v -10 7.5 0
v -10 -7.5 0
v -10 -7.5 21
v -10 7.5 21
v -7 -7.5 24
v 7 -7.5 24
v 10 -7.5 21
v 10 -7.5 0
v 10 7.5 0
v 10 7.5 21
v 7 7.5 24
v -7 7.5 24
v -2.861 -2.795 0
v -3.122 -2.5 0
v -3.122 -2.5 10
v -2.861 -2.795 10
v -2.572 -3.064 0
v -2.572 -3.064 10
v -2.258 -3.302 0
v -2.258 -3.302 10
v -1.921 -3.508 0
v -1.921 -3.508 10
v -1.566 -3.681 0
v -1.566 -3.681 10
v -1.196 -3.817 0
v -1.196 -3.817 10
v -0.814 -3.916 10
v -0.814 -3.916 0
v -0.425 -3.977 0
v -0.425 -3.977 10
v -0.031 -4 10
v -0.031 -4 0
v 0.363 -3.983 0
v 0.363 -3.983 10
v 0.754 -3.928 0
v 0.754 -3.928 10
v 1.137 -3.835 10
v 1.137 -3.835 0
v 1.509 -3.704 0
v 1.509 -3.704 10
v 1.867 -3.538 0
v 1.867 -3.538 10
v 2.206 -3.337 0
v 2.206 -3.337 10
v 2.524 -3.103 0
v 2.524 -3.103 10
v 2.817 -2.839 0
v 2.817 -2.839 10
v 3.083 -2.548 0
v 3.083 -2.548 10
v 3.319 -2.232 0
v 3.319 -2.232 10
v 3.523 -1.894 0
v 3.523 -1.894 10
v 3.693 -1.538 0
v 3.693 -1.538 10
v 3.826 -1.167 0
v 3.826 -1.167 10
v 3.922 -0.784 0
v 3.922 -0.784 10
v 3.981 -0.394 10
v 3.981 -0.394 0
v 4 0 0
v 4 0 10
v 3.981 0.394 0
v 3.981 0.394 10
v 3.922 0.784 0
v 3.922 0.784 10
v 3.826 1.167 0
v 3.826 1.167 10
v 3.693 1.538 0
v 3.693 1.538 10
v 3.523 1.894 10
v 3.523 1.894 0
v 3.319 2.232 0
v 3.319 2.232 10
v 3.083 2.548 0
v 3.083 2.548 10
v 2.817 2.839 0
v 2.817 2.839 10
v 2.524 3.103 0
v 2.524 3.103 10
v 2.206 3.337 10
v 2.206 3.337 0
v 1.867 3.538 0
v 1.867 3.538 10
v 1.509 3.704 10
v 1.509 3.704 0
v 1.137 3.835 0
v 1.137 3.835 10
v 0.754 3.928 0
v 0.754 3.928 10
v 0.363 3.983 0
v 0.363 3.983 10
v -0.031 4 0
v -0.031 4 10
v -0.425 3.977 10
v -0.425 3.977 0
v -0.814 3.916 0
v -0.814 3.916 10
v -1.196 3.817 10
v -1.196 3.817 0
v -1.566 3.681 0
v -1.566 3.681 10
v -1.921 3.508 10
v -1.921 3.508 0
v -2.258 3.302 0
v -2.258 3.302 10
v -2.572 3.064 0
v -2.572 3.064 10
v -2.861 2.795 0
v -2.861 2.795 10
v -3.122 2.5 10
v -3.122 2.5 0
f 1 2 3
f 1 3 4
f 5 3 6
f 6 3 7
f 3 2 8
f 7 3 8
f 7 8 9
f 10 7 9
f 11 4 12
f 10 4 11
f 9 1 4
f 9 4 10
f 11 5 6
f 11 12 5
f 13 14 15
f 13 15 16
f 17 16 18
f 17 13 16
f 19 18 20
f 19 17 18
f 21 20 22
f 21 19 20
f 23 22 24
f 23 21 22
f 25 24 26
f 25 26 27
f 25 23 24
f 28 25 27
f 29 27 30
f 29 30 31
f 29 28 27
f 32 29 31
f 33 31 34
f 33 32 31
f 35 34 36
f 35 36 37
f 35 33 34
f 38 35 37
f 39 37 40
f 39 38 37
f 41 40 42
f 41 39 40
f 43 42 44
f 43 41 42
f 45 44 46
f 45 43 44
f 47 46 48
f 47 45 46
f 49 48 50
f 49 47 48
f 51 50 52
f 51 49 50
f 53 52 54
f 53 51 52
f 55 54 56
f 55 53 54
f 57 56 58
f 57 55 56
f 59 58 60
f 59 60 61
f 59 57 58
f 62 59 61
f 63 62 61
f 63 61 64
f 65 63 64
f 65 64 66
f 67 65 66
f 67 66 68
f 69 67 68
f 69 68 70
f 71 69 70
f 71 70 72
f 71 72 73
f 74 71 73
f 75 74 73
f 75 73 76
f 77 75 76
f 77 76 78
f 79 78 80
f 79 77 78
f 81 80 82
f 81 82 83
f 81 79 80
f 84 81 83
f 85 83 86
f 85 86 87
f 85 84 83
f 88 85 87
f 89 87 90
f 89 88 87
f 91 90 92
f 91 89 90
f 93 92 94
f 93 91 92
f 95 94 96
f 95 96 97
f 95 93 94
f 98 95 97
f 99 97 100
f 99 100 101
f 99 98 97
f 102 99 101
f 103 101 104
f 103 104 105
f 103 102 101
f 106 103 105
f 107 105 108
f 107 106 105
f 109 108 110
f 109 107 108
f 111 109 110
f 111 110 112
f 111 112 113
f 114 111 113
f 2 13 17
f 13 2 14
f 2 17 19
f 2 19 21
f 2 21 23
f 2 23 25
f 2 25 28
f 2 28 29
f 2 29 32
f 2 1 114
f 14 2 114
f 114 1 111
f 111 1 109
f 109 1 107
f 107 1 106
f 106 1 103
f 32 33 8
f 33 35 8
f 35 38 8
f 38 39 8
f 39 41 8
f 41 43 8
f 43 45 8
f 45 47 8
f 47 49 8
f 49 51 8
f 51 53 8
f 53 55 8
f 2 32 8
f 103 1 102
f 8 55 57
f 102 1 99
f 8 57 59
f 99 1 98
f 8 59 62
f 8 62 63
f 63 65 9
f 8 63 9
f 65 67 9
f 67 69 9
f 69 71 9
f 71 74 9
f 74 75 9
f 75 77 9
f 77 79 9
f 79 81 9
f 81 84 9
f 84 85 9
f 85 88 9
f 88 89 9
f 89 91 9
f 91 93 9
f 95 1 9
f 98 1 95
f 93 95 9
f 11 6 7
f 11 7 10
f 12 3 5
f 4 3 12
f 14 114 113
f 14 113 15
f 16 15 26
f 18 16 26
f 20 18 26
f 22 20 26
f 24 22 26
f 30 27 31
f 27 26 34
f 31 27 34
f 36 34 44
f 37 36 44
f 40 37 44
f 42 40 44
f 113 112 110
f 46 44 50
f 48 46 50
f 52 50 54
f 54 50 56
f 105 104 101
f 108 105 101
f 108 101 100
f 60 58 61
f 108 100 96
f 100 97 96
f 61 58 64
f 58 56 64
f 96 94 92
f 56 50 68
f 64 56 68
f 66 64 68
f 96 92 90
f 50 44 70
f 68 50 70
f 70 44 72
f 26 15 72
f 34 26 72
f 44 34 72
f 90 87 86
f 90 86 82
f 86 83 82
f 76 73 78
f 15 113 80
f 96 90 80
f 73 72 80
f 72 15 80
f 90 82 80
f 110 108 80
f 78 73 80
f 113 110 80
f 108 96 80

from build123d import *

# Parameters (mm, degrees)
SKETCH1_W           = 20
SKETCH1_H           = 15
BOSS_EXTRUDE1_DEPTH = 24
CHAMFER2_SIZE       = 3
CHAMFER3_SIZE       = 3
CUT_EXTRUDE1_DEPTH  = 10


with BuildPart() as part:
    # Sketch1 → Boss-Extrude1 (new body)
    with BuildSketch(Plane.XY):
        Rectangle(SKETCH1_W, SKETCH1_H)
    extrude(amount=BOSS_EXTRUDE1_DEPTH)

    # Chamfer2
    chamfer2_edges = [part.edges().sort_by_distance(p)[0] for p in [
        (10, 0, 24),
    ]]
    chamfer(chamfer2_edges, length=CHAMFER2_SIZE)

    # Chamfer3
    chamfer3_edges = [part.edges().sort_by_distance(p)[0] for p in [
        (-10, 0, 24),
    ]]
    chamfer(chamfer3_edges, length=CHAMFER3_SIZE)

    # Sketch3 → Cut-Extrude1 (cut)
    with BuildSketch(Plane(origin=(0, 0, 0), x_dir=(-1, 0, 0), z_dir=(0, 0, -1))):
        with BuildLine():
            Line((3.122498999, 2.5), (3.122498999, -2.5))
            ThreePointArc((3.122498999, -2.5), (-4, 0), (3.122498999, 2.5))
        make_face()
    extrude(amount=-CUT_EXTRUDE1_DEPTH, mode=Mode.SUBTRACT)


solid = part.part
